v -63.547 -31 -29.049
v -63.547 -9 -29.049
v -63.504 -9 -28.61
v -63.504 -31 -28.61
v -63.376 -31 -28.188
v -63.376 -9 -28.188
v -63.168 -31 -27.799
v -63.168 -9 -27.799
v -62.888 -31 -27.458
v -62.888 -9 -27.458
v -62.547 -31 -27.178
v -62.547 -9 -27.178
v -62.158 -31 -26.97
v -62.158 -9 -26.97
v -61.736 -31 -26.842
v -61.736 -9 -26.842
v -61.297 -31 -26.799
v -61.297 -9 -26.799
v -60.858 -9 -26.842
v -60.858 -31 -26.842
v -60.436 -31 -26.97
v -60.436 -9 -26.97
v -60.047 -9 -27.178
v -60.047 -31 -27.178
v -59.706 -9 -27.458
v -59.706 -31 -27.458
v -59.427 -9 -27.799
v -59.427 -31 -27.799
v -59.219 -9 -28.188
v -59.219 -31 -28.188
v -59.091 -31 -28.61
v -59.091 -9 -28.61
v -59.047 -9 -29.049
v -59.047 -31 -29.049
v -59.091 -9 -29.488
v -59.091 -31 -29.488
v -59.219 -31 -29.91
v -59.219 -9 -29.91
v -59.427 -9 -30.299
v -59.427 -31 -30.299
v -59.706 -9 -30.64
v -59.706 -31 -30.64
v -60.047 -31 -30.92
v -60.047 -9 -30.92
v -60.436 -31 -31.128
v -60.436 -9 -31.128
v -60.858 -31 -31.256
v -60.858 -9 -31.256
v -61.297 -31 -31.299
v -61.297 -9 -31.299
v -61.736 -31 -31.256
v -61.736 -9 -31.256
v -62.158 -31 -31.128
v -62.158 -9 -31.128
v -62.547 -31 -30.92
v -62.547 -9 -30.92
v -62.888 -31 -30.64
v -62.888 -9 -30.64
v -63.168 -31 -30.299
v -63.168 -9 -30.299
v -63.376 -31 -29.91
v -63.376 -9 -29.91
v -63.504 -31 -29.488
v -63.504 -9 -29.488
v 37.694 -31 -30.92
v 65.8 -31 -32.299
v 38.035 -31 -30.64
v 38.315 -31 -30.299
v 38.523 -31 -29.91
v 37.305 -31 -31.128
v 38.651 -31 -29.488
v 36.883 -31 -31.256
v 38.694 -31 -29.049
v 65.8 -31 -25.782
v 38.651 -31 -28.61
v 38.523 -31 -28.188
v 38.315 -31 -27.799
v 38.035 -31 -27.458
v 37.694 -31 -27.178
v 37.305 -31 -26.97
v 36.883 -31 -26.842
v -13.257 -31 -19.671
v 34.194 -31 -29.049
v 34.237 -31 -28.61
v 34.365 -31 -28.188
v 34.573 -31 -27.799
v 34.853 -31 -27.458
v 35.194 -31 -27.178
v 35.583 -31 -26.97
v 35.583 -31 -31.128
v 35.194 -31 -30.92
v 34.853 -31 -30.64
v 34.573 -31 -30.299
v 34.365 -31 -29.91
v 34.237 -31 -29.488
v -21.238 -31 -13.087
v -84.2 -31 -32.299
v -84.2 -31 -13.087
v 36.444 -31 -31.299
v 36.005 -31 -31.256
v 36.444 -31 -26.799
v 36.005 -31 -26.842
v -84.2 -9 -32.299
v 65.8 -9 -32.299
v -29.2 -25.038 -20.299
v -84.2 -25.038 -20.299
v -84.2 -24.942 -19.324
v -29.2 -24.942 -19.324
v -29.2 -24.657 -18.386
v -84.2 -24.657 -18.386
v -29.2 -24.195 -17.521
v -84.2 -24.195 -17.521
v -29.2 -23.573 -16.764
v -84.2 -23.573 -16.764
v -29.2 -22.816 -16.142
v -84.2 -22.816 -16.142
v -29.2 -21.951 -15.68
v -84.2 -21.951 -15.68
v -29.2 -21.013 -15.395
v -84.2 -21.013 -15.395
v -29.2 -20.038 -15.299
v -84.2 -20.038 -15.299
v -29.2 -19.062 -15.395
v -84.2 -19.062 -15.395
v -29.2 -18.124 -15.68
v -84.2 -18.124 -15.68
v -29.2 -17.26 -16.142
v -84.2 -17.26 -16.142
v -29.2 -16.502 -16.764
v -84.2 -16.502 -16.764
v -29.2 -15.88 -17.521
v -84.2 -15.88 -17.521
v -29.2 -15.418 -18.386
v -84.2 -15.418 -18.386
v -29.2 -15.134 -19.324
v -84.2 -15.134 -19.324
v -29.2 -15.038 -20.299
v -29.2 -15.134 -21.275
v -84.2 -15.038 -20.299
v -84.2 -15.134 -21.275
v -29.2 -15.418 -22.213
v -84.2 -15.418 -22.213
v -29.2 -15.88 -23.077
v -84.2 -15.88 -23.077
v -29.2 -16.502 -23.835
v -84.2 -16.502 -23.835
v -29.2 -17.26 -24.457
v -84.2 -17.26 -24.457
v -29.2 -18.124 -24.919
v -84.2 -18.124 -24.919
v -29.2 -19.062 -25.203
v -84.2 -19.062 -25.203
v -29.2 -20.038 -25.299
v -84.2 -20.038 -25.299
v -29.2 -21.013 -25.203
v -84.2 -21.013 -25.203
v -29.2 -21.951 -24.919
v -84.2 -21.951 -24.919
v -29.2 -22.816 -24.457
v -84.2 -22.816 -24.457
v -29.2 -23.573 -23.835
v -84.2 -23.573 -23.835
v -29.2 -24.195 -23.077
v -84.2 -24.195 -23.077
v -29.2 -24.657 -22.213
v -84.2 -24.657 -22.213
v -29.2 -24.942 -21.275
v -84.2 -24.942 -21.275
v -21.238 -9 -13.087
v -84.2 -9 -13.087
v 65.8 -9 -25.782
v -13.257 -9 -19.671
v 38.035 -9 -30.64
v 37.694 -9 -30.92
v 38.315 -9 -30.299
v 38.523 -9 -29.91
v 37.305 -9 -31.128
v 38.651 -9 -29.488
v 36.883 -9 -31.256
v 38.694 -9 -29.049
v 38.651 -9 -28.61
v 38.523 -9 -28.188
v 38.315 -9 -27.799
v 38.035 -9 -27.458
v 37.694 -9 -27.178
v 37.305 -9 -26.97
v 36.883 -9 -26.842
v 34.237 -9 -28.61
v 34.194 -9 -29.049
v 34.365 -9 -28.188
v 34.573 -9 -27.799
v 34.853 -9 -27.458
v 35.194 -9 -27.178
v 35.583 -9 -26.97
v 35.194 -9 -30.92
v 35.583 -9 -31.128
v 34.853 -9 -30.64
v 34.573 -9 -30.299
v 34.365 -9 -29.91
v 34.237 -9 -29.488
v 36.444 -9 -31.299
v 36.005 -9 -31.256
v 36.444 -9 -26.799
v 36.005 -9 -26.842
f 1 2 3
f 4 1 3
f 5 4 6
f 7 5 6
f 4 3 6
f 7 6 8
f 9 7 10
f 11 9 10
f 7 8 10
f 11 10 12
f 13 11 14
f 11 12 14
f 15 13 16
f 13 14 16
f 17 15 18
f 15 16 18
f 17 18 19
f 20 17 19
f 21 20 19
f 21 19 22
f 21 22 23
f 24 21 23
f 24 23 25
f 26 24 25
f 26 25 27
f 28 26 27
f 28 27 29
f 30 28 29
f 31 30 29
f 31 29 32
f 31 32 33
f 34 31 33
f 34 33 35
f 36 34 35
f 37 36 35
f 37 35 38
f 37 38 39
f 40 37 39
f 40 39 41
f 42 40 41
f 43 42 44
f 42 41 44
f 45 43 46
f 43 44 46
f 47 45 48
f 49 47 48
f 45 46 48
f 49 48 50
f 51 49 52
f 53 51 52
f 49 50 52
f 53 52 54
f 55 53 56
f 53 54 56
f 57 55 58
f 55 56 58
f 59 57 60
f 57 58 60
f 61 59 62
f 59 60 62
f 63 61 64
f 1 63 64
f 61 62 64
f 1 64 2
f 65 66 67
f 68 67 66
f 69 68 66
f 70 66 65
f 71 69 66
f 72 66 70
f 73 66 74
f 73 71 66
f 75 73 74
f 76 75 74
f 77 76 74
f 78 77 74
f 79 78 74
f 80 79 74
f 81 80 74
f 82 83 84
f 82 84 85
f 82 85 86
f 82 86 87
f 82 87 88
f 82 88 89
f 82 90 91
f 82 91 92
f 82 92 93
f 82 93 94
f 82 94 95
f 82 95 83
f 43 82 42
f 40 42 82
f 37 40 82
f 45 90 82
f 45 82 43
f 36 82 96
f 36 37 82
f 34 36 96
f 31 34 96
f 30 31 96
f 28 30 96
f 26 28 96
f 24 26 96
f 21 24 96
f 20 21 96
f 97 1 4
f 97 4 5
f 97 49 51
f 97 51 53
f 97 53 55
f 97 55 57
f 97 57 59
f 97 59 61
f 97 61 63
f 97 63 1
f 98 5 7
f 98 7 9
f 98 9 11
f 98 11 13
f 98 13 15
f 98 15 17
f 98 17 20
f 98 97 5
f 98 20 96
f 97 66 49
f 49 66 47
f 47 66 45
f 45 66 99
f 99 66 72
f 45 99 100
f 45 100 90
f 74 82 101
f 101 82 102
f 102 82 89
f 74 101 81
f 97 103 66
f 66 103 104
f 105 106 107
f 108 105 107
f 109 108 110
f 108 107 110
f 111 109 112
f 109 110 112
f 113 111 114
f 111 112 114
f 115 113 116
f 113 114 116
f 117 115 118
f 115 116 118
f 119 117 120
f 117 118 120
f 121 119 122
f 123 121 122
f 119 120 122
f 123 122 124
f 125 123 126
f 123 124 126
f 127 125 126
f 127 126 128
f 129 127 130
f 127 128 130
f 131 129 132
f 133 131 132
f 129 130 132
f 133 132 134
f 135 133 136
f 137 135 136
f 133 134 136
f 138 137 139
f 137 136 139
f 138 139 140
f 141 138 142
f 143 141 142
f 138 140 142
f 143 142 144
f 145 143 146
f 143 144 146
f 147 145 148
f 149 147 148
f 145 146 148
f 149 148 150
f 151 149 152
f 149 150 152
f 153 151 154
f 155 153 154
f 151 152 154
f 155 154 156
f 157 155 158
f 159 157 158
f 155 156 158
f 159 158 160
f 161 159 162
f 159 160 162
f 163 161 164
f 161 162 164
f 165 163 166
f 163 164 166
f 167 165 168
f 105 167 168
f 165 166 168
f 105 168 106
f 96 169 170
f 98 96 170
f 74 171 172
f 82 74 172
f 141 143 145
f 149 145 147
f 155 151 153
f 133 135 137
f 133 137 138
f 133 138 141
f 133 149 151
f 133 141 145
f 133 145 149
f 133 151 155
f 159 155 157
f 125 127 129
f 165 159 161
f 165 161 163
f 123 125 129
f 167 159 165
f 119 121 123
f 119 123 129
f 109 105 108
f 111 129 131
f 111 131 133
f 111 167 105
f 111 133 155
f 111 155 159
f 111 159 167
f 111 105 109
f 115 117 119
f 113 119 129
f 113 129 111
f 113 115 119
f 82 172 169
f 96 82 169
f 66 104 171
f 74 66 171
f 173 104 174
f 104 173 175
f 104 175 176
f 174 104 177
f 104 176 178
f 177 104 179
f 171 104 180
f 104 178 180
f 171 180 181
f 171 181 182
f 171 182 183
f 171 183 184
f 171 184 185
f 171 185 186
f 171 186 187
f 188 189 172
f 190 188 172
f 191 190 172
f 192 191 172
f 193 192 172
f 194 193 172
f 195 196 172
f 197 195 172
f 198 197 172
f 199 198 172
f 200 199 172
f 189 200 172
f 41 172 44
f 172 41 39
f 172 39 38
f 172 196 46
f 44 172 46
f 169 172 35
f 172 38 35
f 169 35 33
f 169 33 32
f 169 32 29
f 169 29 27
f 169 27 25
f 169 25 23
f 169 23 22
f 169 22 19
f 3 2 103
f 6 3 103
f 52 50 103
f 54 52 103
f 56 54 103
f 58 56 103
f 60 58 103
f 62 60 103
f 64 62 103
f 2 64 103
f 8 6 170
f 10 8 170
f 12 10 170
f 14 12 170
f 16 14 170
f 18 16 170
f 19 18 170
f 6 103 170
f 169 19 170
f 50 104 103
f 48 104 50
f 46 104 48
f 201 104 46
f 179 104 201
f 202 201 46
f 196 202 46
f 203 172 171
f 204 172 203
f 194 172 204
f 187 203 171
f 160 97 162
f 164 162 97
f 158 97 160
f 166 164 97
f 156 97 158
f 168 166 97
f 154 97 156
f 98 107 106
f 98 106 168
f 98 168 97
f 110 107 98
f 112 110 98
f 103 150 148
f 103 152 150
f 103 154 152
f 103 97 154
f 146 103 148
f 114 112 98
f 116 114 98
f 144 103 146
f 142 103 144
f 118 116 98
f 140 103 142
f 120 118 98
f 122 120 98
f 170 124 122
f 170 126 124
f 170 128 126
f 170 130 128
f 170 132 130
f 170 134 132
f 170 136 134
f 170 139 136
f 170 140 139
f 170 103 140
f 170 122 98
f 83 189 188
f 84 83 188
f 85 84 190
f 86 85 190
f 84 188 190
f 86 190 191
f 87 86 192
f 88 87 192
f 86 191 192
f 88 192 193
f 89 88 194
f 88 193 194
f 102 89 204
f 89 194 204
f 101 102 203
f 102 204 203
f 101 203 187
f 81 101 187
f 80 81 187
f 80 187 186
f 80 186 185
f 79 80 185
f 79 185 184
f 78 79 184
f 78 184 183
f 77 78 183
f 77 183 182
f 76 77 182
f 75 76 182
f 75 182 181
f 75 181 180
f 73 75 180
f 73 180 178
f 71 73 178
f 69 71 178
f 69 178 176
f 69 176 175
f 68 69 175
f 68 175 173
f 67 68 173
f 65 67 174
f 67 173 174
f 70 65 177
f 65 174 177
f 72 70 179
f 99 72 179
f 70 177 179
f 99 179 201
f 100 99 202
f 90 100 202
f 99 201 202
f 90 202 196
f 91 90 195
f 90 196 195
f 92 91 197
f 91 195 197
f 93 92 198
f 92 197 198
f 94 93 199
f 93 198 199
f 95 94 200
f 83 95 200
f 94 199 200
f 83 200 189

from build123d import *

# Parameters (mm, degrees)
F0_W      = 150
F0_H      = 20
F1_DEPTH  = 40
F2_R      = 5
F3_DEPTH  = 65
F4_W      = 150
F4_H      = 5
F5_DEPTH  = 20.001
F6_R      = 5
F7_DEPTH  = 55
F9_DEPTH  = 30.001
F10_W     = 4
F10_H     = 19.2120939866
F11_DEPTH = 150.001
F12_R     = 2.25
F13_DEPTH = 22.001


with BuildPart() as f1:
    # F0 (on Front) → F1 (new body)
    with BuildSketch(Plane.XZ):
        with Locations((-9.199729269, -22.2991868854)):
            Rectangle(F0_W, F0_H)
    extrude(amount=F1_DEPTH)

    # F2 (on face) → F3 (cut)
    with BuildSketch(Plane(origin=(-84.199729269, 0, 0), x_dir=(0, -1, 0), z_dir=(-1, 0, 0))):
        with Locations((20, 2.7008131146)):
            Circle(F2_R)
    extrude(amount=-F3_DEPTH, mode=Mode.SUBTRACT)

    # F4 (on face) → F5 (cut, through all)
    with BuildSketch(Plane.XY.offset(-12.2991868854)):
        with Locations((-9.199729269, -2.5)):
            Rectangle(F4_W, F4_H)
        with Locations((-9.199729269, -37.5)):
            Rectangle(F4_W, F4_H)
    extrude(amount=-F5_DEPTH, mode=Mode.SUBTRACT)

    # F6 (on face) → F7 (cut)
    with BuildSketch(Plane(origin=(-84.199729269, 0, 0), x_dir=(0, -1, 0), z_dir=(-1, 0, 0))):
        with Locations((20.0377495284, -20.2992462616)):
            Circle(F6_R)
    extrude(amount=-F7_DEPTH, mode=Mode.SUBTRACT)

    # F8 (on face) → F9 (cut, through all)
    with BuildSketch(Plane(origin=(0, -5, 0), x_dir=(-1, 0, 0), z_dir=(0, 1, 0))):
        Polygon((21.2375794259, -13.0870928988), (84.199729269, -13.0870928988), (84.199729269, -12.2991868854), (-65.800270731, -12.2991868854), (-65.800270731, -25.7824789733), (13.2570136338, -19.6707472205), align=None)
    extrude(amount=-F9_DEPTH, mode=Mode.SUBTRACT)

    # F10 (on face) → F11 (cut, through all)
    with BuildSketch(Plane(origin=(-84.199729269, 0, 0), x_dir=(0, -1, 0), z_dir=(-1, 0, 0))):
        with Locations((7, -22.6931398921)):
            Rectangle(F10_W, F10_H)
        with Locations((33, -22.6931398921)):
            Rectangle(F10_W, F10_H)
    extrude(amount=-F11_DEPTH, mode=Mode.SUBTRACT)

    # F12 (on face) → F13 (cut, through all)
    with BuildSketch(Plane(origin=(0, -9, 0), x_dir=(-1, 0, 0), z_dir=(0, 1, 0))):
        with Locations((-36.4439859986, -29.0491868854)):
            Circle(F12_R)
        with Locations((61.297416687, -29.0491868854)):
            Circle(F12_R)
    extrude(amount=-F13_DEPTH, mode=Mode.SUBTRACT)


solid = f1.part
